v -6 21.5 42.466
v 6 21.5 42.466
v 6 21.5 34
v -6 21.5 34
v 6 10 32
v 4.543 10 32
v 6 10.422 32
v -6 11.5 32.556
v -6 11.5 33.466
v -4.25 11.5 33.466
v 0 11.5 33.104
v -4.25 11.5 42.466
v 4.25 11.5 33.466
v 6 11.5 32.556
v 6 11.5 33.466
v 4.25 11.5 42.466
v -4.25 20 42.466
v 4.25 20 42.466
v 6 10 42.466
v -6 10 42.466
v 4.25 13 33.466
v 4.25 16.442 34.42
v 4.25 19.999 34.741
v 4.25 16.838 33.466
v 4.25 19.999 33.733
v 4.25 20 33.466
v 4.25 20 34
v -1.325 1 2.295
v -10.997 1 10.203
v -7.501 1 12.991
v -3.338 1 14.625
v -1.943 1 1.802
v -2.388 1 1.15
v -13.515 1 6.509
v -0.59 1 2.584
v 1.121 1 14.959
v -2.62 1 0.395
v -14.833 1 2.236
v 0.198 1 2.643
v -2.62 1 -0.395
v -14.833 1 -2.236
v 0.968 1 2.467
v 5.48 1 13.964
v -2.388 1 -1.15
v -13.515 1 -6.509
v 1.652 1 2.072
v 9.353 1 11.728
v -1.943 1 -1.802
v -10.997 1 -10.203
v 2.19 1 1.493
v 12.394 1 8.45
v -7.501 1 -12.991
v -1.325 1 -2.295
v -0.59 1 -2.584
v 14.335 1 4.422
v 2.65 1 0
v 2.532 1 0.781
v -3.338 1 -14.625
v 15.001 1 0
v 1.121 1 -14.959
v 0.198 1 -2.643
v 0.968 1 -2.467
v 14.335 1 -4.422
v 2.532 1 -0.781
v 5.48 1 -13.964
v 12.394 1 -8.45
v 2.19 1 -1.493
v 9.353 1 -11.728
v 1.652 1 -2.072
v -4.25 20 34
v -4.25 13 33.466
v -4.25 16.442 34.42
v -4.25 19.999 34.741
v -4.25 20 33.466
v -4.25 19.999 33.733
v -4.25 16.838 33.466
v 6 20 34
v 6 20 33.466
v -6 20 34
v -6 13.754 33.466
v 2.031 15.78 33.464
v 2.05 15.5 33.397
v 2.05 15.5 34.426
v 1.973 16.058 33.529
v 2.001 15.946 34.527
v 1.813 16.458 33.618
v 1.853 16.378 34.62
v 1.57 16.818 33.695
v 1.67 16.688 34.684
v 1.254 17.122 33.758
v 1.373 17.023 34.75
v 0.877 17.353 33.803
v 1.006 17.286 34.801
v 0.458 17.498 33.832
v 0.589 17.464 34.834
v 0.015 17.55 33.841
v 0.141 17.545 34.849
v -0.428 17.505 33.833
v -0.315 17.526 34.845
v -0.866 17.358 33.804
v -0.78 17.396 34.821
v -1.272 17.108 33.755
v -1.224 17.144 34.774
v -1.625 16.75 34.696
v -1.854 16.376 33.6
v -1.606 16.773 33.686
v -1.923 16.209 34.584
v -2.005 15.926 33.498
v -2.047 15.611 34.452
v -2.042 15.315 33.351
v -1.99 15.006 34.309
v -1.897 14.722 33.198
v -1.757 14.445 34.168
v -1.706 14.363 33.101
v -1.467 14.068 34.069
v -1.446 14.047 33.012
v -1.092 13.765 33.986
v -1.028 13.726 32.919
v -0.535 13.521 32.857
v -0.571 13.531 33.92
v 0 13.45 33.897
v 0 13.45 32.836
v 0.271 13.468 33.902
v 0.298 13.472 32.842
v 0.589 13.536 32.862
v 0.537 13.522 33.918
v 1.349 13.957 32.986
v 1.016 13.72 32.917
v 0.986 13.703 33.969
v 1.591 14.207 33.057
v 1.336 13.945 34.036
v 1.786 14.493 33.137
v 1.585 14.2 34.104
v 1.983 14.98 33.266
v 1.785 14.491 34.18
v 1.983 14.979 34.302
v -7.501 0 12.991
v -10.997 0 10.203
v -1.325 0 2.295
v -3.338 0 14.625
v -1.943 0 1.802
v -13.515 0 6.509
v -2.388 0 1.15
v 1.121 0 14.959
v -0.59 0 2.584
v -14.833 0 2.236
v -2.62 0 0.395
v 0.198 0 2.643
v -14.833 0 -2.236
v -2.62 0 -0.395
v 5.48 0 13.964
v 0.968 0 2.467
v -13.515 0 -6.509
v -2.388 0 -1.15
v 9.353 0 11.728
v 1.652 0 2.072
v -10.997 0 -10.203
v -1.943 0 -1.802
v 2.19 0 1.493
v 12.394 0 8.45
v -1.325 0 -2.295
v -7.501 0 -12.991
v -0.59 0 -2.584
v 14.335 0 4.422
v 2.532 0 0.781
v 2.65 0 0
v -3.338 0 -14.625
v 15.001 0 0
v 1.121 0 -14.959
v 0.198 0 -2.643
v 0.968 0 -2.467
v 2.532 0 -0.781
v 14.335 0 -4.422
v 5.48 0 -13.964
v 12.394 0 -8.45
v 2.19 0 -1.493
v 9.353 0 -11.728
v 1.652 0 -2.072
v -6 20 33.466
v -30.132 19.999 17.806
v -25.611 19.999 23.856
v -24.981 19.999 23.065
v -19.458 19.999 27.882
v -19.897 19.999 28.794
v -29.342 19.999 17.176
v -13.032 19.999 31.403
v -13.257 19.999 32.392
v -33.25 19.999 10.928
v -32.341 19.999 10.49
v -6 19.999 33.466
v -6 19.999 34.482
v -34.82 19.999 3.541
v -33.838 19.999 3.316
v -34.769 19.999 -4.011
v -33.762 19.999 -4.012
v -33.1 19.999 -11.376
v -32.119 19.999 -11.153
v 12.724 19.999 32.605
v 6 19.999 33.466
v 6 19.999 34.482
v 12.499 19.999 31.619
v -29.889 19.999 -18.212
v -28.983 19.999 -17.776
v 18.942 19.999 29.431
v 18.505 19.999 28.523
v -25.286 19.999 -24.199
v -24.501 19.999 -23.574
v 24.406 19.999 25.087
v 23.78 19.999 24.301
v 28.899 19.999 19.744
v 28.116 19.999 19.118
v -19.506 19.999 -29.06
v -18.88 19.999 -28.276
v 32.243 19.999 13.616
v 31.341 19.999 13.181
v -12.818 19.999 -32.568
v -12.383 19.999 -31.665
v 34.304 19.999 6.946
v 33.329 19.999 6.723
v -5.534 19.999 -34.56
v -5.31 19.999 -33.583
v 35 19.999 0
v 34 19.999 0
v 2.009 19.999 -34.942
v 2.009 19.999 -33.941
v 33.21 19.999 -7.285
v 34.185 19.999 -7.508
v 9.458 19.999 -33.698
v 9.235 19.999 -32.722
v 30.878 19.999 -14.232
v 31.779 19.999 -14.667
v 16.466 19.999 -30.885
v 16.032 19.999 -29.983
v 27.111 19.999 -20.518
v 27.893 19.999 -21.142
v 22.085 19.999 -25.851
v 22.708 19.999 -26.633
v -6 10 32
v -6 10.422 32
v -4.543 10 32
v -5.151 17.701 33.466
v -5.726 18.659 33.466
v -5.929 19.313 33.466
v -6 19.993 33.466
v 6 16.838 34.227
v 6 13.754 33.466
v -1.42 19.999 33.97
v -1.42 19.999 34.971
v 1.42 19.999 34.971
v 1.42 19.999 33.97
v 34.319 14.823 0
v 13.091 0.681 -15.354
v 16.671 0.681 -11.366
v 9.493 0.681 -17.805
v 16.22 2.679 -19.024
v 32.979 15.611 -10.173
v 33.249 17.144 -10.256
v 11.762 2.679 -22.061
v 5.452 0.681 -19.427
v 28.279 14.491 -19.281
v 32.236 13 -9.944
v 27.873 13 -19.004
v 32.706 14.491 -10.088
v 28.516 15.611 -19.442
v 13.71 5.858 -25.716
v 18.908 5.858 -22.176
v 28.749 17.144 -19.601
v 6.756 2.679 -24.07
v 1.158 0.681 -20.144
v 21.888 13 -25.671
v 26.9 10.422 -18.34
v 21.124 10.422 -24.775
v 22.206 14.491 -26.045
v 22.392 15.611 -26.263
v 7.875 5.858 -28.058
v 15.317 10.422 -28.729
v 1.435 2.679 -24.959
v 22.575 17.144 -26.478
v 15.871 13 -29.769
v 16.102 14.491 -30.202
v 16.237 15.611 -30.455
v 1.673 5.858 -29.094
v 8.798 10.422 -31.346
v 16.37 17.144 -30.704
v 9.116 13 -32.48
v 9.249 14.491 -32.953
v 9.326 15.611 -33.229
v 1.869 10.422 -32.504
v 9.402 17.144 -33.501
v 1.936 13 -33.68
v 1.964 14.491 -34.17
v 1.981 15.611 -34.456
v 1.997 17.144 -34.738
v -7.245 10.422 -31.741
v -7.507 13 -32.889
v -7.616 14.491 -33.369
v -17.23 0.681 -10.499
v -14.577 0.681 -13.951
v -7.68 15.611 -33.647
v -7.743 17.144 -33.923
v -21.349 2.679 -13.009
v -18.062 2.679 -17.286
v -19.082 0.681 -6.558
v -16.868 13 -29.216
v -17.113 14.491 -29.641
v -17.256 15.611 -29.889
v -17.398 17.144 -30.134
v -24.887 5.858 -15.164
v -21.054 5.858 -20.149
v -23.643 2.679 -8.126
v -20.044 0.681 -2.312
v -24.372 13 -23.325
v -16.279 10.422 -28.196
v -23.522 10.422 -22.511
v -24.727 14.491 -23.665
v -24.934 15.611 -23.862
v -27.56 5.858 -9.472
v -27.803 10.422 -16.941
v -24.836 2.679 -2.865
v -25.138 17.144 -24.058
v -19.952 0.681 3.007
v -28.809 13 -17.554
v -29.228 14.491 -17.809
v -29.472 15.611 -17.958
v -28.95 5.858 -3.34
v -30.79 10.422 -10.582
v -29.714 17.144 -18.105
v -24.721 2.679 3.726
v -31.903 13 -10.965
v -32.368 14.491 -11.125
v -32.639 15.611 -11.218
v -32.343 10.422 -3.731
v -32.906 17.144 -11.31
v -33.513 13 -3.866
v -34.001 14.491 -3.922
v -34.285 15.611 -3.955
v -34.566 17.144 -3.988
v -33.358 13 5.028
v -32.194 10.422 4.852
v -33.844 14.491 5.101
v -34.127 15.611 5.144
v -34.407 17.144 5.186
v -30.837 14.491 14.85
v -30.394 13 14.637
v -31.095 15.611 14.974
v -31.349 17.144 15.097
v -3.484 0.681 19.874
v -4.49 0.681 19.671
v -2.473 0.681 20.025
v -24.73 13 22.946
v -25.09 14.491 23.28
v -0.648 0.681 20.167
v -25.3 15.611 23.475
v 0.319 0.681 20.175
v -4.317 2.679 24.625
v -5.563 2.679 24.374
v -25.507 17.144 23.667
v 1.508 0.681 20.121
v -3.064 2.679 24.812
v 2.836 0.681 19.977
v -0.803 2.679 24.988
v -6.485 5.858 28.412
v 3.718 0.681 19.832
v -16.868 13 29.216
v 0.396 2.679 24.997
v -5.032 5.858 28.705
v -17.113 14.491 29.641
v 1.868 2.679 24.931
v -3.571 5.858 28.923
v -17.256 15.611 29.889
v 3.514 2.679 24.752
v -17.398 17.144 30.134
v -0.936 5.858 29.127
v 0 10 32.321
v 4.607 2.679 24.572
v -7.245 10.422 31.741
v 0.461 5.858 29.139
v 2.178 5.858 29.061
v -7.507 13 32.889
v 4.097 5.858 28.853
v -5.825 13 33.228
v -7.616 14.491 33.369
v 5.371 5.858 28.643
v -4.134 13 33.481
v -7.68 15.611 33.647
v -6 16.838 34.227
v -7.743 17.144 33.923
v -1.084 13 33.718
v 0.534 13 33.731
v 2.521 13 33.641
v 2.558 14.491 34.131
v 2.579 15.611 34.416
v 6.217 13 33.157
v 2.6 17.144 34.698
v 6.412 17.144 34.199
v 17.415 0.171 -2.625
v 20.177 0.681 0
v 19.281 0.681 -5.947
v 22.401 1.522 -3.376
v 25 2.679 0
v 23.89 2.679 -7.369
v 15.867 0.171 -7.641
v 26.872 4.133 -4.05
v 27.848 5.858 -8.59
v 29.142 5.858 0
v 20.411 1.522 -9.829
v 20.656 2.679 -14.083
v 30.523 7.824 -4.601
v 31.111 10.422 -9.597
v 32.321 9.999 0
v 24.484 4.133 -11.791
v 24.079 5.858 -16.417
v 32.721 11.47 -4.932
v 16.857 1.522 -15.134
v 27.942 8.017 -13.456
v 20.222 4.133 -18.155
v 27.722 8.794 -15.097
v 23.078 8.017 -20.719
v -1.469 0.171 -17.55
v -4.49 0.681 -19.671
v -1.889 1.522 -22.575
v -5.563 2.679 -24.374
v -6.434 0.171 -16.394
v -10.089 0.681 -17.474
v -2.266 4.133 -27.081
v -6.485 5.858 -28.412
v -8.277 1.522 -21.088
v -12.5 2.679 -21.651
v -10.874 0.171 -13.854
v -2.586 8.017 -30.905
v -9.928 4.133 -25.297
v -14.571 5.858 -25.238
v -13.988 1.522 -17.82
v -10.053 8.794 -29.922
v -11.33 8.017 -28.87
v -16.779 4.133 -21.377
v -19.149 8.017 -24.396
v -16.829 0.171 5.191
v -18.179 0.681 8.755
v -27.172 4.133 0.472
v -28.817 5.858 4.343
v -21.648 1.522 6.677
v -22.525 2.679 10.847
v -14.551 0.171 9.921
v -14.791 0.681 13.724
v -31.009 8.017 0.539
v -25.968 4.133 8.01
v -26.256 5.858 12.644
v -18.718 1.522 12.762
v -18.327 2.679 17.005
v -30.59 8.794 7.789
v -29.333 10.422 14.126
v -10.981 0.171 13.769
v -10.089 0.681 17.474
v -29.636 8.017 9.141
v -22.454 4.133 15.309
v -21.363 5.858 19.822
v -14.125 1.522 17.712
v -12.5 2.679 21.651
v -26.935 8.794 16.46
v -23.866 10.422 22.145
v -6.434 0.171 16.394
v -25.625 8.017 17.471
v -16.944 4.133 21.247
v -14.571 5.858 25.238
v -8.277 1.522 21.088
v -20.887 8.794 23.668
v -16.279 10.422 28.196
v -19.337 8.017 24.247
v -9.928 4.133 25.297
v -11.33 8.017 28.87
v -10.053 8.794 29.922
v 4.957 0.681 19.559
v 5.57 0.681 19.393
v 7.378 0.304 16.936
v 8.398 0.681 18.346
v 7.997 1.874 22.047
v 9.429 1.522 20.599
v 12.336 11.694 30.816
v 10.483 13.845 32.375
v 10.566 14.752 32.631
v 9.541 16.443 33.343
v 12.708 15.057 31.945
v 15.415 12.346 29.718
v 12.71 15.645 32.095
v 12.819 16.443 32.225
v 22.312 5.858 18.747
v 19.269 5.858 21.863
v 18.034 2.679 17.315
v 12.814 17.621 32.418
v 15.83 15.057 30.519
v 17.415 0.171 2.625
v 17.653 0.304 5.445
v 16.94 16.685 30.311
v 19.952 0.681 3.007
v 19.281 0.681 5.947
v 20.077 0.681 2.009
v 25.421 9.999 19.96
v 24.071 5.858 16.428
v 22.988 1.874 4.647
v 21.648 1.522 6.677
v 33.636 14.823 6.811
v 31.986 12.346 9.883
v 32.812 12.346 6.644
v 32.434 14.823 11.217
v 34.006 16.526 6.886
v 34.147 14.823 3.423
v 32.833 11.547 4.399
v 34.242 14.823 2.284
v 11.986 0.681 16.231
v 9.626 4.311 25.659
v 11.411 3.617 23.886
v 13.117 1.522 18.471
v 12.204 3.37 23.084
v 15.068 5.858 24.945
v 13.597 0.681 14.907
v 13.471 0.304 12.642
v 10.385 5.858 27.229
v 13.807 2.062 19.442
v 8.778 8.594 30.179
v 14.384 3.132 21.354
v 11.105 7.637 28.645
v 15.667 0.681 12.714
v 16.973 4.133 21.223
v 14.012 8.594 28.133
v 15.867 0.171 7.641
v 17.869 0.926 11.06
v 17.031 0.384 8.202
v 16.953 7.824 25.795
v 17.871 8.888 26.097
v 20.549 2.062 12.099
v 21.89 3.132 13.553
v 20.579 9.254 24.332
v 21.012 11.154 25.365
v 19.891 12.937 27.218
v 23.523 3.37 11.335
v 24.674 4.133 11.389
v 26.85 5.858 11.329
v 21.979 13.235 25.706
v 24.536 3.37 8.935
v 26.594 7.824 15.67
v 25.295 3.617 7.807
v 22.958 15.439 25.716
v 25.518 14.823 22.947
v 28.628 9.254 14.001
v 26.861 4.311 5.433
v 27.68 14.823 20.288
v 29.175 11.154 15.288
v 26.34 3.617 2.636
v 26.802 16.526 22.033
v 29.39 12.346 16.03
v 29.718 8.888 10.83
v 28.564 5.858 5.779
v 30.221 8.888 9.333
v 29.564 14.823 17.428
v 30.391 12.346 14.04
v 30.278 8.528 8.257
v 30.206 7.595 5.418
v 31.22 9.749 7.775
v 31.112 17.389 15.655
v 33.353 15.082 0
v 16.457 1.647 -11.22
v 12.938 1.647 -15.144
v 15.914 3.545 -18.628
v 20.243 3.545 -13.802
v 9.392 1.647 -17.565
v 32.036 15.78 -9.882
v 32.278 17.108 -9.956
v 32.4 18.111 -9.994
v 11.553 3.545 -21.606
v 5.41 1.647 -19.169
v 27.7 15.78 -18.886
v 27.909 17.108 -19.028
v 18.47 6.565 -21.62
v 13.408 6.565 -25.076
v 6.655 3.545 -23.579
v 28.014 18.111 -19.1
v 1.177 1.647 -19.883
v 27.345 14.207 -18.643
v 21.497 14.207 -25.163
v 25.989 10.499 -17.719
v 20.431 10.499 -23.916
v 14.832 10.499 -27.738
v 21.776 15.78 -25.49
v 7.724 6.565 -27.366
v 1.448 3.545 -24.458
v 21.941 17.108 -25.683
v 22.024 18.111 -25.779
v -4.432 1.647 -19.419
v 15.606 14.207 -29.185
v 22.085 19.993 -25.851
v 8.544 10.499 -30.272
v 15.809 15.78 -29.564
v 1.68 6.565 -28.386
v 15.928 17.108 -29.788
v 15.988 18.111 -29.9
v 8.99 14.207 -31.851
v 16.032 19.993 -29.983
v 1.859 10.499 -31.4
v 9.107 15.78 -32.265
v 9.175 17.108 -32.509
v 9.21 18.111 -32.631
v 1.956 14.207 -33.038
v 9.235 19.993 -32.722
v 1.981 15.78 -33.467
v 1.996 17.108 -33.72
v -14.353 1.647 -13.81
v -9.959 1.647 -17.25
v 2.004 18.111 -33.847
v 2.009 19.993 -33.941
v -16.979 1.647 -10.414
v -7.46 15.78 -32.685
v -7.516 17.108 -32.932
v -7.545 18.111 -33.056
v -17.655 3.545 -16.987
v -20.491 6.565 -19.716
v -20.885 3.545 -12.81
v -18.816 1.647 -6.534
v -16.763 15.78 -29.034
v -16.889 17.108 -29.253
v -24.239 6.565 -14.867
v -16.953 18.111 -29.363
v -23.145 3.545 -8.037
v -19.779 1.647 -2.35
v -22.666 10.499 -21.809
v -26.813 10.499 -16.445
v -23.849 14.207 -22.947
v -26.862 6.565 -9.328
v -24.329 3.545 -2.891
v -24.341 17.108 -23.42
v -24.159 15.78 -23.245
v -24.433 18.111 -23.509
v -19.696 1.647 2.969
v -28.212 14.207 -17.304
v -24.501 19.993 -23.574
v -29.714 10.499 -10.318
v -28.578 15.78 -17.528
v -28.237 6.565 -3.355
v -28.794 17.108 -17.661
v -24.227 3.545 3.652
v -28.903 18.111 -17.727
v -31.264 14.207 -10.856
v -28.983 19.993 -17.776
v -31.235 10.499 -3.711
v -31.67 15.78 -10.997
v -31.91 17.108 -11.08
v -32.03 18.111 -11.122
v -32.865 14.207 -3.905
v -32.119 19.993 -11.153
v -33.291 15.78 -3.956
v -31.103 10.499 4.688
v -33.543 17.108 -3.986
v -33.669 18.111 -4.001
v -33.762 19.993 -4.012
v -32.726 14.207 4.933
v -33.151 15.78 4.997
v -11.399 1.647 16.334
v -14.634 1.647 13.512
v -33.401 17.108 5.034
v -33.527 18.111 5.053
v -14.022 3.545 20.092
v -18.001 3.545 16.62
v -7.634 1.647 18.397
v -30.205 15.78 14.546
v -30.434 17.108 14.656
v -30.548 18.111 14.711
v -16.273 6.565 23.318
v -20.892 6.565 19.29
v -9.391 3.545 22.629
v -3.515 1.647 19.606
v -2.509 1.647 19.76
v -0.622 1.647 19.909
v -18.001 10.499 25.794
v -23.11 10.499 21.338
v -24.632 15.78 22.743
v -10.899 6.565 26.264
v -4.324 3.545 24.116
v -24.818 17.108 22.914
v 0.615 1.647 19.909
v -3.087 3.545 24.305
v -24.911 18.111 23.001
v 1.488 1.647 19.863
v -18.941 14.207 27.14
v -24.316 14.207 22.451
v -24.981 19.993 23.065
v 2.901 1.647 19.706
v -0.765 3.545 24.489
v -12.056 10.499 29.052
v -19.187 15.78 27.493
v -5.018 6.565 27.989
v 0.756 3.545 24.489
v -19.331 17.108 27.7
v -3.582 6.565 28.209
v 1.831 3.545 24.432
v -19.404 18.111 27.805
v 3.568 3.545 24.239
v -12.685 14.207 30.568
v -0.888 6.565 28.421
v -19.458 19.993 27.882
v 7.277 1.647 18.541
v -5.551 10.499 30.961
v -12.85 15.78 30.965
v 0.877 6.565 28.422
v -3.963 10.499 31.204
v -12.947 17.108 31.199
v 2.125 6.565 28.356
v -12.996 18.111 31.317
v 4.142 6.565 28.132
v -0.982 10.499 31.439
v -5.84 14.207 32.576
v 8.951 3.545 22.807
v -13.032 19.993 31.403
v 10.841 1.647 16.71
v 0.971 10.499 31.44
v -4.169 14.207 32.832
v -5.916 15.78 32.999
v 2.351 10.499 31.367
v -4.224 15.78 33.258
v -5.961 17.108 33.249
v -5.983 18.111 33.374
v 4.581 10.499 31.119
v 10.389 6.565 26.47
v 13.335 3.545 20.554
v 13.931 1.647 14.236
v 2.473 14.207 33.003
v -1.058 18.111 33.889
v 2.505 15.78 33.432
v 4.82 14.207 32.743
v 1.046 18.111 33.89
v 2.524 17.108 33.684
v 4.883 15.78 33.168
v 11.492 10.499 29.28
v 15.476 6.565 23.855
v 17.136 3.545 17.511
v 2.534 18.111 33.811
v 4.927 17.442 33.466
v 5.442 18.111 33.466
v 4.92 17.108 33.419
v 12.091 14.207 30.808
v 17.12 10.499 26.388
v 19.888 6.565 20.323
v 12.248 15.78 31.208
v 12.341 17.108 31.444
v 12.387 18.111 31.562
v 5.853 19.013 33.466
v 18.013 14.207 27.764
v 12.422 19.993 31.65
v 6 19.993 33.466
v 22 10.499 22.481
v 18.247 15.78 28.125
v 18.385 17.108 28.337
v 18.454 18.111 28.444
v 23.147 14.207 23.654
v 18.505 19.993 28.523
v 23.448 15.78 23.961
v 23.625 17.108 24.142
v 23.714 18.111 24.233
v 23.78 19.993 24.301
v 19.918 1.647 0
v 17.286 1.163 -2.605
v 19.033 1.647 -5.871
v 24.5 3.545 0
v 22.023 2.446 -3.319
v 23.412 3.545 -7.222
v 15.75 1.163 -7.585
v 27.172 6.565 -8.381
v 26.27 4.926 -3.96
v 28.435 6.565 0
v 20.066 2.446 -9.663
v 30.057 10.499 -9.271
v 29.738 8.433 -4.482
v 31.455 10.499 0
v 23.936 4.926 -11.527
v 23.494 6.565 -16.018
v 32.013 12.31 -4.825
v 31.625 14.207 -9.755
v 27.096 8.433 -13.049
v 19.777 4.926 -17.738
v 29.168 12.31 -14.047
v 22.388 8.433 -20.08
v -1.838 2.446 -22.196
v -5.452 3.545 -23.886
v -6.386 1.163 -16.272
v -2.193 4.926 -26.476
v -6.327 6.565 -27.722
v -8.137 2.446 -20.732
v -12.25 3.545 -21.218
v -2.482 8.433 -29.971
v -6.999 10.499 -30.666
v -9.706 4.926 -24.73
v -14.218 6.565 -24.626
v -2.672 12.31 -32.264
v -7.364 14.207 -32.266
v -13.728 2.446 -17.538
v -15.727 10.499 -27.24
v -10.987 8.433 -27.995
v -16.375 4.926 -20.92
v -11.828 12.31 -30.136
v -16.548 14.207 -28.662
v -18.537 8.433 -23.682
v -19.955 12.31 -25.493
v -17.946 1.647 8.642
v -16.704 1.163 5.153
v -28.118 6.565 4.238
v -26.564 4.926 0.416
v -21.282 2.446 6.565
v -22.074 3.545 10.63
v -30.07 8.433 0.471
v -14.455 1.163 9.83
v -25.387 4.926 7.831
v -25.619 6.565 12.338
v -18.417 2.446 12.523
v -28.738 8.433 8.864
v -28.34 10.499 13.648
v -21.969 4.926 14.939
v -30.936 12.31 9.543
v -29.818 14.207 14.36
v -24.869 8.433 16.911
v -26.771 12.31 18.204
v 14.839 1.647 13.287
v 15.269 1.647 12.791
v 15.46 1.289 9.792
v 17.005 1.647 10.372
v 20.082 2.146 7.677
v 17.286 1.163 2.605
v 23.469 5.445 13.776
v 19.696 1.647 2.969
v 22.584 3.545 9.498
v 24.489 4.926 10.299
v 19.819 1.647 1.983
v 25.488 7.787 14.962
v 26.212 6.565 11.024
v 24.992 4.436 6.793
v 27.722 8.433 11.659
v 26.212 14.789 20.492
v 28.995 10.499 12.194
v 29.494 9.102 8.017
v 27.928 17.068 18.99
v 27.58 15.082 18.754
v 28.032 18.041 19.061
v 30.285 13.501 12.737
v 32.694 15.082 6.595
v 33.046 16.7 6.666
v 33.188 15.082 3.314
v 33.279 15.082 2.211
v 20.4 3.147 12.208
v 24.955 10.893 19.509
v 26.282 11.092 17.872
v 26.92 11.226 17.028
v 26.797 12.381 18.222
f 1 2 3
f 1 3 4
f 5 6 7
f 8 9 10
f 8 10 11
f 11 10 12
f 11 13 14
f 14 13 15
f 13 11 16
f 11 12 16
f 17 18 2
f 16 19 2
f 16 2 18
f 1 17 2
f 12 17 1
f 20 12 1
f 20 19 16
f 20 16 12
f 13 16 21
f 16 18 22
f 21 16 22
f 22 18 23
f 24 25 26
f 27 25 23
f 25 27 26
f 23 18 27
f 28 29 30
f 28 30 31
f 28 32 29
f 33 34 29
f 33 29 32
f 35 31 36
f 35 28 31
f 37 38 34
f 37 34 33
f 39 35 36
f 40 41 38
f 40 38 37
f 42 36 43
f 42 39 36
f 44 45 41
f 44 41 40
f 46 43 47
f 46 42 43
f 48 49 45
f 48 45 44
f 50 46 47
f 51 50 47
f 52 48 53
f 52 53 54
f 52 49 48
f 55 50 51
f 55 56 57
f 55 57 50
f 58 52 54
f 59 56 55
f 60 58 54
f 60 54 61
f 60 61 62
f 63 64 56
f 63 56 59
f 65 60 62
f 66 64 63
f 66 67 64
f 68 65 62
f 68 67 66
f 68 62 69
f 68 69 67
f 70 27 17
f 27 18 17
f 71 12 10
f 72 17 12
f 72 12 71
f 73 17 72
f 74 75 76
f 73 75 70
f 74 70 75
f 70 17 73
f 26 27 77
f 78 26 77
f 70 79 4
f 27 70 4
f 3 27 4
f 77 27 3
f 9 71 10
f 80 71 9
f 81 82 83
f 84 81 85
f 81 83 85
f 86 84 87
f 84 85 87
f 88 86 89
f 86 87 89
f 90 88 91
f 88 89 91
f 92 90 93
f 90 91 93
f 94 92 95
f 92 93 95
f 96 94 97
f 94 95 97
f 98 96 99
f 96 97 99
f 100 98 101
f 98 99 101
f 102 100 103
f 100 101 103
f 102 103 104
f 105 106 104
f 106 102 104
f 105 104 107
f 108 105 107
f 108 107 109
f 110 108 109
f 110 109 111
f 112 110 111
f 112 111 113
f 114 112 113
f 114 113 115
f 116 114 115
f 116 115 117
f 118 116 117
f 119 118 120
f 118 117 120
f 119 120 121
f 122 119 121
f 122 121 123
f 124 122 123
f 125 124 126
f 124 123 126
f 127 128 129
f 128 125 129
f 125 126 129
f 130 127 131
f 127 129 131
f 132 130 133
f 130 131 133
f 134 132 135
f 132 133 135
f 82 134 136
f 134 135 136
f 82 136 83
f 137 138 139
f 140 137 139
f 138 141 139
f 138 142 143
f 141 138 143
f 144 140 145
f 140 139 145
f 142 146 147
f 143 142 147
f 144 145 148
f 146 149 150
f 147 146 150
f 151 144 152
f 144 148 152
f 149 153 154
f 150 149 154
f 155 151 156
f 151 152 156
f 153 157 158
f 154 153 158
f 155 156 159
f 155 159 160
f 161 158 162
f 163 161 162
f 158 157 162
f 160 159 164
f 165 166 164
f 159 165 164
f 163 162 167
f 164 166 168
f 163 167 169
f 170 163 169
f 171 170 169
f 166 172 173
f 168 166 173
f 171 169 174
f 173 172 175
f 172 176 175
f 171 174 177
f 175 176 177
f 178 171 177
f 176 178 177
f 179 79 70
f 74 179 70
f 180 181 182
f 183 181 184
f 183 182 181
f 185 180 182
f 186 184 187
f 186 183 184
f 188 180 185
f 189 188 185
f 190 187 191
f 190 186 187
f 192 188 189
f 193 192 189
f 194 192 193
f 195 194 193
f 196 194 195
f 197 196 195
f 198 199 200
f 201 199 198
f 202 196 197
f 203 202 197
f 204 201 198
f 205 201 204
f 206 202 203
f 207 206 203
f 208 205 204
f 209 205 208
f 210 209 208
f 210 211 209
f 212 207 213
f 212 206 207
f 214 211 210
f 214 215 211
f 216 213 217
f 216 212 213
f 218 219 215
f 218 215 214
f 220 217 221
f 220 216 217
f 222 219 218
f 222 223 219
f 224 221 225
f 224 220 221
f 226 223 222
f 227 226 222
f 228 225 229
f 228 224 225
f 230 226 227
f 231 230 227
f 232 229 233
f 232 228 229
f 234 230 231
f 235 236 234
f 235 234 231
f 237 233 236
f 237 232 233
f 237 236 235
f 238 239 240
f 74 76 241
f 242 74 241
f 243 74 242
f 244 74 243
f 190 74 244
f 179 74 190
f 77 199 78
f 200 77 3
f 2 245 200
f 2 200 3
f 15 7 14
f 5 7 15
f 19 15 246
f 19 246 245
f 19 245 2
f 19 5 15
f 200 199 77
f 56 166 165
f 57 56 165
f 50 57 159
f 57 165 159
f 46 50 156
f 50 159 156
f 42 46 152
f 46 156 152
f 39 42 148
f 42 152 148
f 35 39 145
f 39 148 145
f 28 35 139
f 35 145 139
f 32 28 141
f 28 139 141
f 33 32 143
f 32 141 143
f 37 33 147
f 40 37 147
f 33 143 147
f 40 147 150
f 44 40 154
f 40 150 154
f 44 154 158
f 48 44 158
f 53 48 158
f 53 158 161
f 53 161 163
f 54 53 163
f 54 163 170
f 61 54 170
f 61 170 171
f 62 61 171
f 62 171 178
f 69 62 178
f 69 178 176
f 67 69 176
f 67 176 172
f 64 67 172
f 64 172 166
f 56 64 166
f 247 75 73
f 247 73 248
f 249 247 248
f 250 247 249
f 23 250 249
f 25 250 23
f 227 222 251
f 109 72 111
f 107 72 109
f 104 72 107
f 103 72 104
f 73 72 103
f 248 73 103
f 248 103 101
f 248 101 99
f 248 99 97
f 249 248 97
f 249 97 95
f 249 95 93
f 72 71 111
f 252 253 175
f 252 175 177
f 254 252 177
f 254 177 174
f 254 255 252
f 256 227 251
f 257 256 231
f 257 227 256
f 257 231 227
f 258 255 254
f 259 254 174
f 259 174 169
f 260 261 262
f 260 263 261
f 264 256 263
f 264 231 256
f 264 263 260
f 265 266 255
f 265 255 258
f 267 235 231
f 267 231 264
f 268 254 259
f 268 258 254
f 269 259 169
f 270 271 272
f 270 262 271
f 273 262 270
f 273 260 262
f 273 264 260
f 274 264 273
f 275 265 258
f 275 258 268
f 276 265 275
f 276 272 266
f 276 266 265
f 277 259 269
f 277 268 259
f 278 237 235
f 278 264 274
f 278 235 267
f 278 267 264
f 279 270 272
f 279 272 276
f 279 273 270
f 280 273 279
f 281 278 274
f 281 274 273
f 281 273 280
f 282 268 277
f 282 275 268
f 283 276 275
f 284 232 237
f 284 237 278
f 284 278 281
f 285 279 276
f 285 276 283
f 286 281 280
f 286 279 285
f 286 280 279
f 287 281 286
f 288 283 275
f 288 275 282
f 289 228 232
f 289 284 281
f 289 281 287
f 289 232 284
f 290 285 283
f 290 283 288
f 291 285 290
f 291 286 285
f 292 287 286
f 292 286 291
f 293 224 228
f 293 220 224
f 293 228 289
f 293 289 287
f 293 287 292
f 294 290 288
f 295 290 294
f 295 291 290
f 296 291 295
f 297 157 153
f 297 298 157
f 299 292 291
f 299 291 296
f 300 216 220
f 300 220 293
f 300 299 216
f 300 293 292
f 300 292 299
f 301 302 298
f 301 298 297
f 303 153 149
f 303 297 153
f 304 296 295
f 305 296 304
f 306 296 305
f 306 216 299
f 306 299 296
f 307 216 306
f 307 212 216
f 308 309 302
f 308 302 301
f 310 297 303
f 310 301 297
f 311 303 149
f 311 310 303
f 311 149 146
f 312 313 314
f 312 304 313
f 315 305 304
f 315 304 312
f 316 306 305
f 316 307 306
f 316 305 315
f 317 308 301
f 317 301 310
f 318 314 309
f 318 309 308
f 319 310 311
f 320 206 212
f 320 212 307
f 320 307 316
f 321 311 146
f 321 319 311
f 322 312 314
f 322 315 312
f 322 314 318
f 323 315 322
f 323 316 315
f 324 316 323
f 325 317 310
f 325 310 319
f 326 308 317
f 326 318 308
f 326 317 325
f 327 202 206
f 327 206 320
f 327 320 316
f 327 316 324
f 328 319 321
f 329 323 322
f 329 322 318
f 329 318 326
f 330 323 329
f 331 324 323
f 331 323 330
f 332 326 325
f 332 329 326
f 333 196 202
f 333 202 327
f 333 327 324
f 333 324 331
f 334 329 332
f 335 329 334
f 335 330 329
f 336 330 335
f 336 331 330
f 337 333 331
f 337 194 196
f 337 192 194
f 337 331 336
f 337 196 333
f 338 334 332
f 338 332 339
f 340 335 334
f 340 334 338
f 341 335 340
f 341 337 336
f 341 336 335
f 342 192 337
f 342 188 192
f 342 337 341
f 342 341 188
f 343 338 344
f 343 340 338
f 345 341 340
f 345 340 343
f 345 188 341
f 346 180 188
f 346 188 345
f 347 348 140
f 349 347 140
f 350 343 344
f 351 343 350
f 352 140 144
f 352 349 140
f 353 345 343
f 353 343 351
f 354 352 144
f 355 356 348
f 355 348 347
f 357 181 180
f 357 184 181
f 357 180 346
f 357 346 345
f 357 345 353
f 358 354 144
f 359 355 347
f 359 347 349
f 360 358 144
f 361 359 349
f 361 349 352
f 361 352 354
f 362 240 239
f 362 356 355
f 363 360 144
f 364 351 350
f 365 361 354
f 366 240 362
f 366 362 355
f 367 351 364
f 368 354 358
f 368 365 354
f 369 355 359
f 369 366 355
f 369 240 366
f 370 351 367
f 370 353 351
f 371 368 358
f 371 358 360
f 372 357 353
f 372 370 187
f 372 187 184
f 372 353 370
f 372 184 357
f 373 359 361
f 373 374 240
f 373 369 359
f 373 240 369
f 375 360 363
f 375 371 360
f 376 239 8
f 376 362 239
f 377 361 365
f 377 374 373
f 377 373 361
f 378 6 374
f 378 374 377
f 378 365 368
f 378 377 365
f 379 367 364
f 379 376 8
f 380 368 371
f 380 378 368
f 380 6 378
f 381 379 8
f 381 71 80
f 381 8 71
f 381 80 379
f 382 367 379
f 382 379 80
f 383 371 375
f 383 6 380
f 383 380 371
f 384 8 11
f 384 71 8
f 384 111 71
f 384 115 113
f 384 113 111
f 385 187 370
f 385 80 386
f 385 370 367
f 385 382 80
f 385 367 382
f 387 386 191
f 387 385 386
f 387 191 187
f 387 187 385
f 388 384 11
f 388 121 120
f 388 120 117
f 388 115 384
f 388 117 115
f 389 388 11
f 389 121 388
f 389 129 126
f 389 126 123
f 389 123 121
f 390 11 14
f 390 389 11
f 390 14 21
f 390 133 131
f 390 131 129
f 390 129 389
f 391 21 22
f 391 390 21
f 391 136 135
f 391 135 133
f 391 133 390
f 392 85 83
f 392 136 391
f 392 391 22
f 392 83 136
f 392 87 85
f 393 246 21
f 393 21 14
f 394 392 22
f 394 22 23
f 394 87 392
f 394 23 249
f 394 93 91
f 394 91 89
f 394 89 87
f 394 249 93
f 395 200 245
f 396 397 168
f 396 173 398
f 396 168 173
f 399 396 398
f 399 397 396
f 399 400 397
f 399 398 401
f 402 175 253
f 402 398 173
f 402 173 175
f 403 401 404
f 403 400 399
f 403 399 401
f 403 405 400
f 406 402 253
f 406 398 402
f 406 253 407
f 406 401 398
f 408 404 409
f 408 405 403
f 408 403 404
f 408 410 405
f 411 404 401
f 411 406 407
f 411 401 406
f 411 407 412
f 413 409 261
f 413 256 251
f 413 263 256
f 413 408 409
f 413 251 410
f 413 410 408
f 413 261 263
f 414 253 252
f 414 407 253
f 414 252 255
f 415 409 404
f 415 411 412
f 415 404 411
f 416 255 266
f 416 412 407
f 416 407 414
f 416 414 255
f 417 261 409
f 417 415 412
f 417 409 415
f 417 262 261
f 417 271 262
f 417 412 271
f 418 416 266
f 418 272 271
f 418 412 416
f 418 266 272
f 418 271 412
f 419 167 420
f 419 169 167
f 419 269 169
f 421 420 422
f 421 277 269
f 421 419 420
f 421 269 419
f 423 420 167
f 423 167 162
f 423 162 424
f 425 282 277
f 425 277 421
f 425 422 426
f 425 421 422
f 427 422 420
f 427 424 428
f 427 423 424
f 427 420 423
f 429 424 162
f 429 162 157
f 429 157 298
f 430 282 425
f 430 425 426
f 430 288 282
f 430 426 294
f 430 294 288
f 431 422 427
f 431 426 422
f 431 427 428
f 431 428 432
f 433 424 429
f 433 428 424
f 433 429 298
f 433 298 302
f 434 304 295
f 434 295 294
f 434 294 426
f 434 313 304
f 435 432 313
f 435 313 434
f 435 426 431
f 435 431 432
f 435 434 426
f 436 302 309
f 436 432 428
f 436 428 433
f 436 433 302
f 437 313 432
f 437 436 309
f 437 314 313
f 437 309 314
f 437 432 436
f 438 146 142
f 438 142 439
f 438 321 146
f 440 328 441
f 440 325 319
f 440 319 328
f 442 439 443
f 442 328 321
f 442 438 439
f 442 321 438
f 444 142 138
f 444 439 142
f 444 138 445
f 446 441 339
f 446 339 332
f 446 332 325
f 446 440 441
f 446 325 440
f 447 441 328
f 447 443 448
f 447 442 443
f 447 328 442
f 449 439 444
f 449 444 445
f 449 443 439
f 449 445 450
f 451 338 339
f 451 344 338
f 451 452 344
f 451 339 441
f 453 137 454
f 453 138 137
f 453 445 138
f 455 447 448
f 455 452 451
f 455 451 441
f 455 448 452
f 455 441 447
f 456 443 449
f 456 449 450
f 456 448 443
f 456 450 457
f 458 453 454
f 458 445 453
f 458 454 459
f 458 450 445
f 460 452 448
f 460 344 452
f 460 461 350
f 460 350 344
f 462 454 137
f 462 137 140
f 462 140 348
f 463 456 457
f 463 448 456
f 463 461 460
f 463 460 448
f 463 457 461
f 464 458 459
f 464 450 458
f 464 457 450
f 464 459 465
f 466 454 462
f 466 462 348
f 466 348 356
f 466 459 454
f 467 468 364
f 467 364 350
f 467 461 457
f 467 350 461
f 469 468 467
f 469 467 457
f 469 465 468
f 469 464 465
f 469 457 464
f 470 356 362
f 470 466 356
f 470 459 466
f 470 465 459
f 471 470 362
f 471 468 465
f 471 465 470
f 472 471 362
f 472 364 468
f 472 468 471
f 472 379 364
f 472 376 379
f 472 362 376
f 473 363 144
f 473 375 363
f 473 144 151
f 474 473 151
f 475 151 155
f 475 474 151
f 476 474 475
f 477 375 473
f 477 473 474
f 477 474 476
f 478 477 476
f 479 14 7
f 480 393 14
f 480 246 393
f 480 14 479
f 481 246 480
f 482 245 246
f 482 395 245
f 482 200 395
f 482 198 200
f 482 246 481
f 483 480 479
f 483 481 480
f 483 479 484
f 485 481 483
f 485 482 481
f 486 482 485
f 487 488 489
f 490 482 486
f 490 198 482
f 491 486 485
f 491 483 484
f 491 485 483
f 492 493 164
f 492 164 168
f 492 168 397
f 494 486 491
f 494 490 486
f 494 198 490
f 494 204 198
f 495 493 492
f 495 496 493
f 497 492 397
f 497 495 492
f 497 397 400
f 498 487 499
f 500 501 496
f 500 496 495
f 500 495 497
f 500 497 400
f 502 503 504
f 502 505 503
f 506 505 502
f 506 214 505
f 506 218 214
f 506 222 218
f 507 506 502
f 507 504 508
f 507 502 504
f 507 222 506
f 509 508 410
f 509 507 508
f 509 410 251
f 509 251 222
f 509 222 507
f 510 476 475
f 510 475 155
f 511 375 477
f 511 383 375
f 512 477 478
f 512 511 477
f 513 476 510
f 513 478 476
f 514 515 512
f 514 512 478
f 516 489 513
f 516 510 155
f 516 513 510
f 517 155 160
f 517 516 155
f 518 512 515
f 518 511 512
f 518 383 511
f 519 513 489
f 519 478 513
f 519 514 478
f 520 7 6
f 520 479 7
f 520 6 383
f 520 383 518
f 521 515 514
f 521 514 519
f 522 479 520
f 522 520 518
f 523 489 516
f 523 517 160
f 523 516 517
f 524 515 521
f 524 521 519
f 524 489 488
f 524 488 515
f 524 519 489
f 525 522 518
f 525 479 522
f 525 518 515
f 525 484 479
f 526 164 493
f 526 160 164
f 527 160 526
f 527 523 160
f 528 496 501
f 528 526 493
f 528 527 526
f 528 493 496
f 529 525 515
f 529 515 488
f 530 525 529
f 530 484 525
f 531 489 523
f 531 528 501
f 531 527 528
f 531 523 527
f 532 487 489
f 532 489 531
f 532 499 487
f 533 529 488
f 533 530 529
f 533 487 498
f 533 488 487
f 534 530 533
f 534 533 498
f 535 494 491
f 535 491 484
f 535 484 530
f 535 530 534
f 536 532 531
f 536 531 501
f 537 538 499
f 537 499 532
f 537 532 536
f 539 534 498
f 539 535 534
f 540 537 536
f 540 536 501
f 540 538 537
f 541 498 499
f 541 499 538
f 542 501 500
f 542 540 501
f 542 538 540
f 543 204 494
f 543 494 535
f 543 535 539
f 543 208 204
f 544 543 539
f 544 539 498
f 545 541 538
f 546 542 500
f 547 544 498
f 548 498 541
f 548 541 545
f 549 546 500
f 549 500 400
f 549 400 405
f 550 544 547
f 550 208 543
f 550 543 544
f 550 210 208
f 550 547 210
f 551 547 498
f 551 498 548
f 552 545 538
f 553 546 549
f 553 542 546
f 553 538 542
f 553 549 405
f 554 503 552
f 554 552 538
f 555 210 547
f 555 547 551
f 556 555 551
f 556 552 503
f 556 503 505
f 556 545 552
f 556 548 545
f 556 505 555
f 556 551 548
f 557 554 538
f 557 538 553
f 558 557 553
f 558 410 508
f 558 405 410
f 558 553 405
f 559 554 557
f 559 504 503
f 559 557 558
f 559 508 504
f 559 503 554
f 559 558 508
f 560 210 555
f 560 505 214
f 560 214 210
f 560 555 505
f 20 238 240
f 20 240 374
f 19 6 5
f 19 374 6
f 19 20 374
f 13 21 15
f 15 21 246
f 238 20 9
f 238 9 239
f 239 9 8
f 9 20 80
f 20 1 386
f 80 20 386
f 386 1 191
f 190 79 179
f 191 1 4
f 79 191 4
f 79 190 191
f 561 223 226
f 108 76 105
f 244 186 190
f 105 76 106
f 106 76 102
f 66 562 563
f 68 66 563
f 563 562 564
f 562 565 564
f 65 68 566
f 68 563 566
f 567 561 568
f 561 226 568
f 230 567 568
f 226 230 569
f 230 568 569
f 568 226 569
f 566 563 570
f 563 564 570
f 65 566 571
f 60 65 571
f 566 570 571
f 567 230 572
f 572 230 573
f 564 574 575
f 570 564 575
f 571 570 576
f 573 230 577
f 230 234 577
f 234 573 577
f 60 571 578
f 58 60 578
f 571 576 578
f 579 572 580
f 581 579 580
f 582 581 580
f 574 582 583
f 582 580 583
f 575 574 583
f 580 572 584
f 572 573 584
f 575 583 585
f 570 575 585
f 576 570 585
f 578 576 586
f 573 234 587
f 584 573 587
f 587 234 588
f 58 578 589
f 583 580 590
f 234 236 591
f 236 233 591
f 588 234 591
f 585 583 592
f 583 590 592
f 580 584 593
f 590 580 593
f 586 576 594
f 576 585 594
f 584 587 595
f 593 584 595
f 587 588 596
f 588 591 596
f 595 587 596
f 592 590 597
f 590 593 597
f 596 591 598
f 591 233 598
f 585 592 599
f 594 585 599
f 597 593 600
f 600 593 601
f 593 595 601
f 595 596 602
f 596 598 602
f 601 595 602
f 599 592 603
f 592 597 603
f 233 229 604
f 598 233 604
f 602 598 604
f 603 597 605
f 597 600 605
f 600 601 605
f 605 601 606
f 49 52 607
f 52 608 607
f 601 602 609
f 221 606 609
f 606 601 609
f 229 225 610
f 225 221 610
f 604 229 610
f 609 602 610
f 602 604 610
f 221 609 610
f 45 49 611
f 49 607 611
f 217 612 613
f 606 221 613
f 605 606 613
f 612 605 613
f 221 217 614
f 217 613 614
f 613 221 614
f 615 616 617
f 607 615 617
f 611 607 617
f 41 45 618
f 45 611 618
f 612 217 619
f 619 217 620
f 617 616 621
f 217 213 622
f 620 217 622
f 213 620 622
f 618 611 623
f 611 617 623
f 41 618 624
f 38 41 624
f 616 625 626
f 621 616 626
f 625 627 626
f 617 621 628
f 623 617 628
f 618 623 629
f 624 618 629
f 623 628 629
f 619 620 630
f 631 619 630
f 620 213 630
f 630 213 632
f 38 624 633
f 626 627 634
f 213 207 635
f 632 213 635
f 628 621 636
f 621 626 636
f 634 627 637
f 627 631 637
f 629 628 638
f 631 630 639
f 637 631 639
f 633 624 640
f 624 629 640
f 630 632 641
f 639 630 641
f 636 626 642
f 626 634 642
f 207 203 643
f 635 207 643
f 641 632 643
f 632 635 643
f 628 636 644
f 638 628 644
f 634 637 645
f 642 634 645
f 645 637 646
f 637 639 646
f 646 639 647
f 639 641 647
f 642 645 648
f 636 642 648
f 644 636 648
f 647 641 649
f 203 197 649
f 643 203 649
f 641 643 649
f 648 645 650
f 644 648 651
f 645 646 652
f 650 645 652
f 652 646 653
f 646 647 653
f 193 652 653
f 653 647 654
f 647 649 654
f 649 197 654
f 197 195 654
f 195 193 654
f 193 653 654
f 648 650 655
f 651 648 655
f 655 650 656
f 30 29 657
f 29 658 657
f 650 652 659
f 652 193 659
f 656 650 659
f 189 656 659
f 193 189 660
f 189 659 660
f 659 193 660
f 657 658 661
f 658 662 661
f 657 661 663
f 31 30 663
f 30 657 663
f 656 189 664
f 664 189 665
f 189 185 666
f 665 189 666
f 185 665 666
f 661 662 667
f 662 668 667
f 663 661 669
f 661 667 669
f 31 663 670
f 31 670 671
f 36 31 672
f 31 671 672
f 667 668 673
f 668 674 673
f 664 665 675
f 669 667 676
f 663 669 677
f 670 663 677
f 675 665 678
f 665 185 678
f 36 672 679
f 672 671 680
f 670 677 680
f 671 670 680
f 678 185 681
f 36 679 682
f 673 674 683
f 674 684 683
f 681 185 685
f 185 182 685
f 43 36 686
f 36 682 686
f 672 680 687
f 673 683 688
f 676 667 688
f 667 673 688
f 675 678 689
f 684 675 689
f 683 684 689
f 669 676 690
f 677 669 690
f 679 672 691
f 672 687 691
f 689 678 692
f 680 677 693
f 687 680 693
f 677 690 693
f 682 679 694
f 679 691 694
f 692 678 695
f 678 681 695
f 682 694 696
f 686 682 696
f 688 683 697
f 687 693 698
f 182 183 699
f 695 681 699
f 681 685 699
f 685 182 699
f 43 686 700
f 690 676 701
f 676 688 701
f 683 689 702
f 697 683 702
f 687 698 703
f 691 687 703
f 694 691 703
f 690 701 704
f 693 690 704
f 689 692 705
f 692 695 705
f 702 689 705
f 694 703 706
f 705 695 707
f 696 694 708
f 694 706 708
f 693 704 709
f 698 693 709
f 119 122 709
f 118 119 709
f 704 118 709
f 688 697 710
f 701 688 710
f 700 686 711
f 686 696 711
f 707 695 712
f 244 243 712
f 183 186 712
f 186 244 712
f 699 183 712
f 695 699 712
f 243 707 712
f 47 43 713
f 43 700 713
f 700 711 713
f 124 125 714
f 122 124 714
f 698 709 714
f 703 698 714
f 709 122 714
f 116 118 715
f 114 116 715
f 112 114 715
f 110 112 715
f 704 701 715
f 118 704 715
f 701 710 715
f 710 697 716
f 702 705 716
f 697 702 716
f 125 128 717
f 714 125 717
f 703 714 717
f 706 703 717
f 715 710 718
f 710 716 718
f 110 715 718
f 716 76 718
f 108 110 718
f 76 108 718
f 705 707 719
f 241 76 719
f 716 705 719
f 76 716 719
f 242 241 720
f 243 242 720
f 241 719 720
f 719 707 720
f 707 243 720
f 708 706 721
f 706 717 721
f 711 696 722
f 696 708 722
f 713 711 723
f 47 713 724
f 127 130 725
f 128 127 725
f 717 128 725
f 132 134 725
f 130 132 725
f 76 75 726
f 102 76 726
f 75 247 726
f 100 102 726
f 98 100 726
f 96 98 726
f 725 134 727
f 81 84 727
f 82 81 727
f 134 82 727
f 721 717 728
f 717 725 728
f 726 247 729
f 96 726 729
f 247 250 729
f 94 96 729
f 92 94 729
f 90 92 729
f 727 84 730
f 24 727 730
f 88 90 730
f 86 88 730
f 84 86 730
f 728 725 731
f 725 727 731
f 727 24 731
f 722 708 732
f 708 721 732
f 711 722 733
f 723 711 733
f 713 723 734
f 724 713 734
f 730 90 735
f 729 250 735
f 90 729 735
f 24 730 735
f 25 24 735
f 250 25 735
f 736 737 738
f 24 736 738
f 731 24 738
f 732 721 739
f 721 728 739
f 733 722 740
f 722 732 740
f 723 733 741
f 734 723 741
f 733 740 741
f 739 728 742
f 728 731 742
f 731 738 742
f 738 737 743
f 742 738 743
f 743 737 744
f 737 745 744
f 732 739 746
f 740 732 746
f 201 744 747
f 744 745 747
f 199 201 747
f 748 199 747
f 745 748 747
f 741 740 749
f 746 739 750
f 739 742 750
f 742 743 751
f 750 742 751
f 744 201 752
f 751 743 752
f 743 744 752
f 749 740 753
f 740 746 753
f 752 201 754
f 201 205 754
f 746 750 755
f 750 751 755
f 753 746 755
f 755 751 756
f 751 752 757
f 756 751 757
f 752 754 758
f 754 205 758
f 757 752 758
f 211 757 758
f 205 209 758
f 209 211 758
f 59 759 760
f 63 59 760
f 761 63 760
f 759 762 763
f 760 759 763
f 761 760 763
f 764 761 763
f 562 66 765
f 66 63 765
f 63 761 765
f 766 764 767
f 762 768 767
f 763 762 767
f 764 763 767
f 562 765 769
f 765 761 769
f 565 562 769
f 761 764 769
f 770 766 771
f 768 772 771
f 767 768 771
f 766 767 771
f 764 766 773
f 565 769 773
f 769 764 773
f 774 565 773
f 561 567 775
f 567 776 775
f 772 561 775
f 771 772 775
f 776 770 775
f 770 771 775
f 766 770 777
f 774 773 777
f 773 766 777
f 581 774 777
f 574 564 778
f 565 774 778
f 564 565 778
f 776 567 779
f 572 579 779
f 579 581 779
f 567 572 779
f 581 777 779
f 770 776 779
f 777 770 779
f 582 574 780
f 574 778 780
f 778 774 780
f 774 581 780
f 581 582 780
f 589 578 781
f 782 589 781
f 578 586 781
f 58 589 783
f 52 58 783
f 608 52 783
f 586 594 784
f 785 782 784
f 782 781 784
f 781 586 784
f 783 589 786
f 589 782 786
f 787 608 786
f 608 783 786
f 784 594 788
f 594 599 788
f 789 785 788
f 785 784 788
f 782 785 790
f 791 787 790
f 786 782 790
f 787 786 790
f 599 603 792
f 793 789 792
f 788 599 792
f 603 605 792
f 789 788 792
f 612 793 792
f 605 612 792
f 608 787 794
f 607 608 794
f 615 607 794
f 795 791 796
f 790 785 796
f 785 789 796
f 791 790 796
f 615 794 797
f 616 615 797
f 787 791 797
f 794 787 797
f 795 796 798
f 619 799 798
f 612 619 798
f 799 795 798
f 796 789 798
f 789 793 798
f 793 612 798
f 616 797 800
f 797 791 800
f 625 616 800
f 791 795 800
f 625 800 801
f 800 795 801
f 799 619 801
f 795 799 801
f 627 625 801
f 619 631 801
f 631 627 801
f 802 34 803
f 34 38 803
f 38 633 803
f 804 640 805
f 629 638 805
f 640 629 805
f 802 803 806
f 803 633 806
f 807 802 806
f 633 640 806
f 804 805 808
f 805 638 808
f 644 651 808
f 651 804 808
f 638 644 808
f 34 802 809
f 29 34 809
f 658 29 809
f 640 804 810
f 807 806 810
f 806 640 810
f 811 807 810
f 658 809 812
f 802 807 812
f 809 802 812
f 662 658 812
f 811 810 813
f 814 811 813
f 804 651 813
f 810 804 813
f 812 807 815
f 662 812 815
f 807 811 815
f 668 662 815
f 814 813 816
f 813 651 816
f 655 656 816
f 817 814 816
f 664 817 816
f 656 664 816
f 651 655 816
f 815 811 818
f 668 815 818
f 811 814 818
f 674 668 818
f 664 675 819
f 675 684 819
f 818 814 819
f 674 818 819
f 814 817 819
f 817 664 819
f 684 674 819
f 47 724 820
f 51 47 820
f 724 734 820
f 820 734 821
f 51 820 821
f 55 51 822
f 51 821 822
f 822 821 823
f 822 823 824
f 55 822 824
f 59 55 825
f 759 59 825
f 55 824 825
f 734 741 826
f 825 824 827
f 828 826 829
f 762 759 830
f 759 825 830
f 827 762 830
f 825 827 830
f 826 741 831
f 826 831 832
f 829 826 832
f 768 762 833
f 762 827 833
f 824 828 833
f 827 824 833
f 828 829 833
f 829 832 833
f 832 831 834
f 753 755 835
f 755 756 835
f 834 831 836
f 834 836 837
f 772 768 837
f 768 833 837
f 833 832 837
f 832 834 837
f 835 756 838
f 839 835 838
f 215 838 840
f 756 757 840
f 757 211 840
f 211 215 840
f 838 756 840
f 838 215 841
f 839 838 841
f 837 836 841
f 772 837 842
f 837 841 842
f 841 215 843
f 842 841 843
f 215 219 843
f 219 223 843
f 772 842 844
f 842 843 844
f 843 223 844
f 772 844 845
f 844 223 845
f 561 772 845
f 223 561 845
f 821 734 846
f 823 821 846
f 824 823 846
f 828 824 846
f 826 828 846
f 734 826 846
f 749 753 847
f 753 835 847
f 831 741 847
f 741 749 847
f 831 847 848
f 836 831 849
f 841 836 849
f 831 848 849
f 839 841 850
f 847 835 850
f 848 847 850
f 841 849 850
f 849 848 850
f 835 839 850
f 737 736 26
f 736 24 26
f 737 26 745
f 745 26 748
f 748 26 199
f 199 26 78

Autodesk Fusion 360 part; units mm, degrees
sketch "Sketch1" plane through (0, 0, 0) normal (0, 0, 1) x (1, 0, 0)
  line L0 (0, 0) -> (15.001, 0)
  line L1 (35, 19.999) -> (35, 20)
  arc A0 (15.001, 0) -> (35, 19.999) centre (15.001, 19.999) ccw
  line L2 (0, 1) -> (15.001, 1)
  arc A1 (15.001, 1) -> (34, 19.999) centre (15.001, 19.999) ccw
  line L3 (34, 19.999) -> (34, 20)
  line L4 (34, 20) -> (35, 20)
  line L5 (0, 1) -> (0, 0)
  point P0 (35, 0)
  dimension "d1" = 35
  dimension "d2" = 20
  dimension "d3" = 19.999
  dimension "d4" = -1
revolve "Revolve1" add sketch "Sketch1" angle 360 about axis through (0, 1.75, 0) along (0, 1, 0)
ref_plane "WorkPlane1" through (0, 0, 35) normal (0, 0, 1) x (1, 0, 0)
sketch "Sketch2" plane through (0, 0, 35) normal (0, 0, 1) x (1, 0, 0)
  line L0 (0, 0) -> (0, 15.5)
  circle A0 centre (0, 15.5) radius 2.05
  dimension "d7" = 15.5
  dimension "d8" = 4.1
extrude "Extrude1" cut sketch "Sketch2" against normal blind 10
sketch "Sketch3" plane through (0, 0, 0) normal (0, -1, 0) x (1, 0, 0)
  circle A0 centre (0, 0) radius 15.001
  circle A1 centre (0, 0) radius 2.65
  dimension "d11" = 5.3
extrude "Extrude2" cut sketch "Sketch3" along normal blind 30 and the other way blind 30 contours A1
sketch "Sketch4" plane through (0, 20, 0) normal (0, 1, 0) x (-1, 0, 0)
  circle A0 centre (0, 0) radius 34
  circle A1 centre (0, 0) radius 35
  line L0 (-6, 42.4664) -> (6, 42.4664)
  line L1 (6, 42.4664) -> (6, 33.4664)
  line L2 (-6, 33.4664) -> (-6, 42.4664)
  line L3 (-6, 42.4664) -> (0, 34) construction
  line L4 (6, 42.4664) -> (0, 34) construction
  line L5 (0, 34) -> (-6, 34)
  line L6 (0, 34) -> (6, 34)
  dimension "d16" = 9
  dimension "d19" = 12
  dimension "d20" = 6
extrude "Extrude3" add sketch "Sketch4" along normal blind 1.5 contours A1 L1 L2 L5 L6 | A1 L0 L1 L2
sketch "Sketch5" plane through (0, 20, 0) normal (0, -1, 0) x (1, 0, 0)
  arc A0 (6, 34.4819) -> (-6, 34.4819) centre (0, 0) ccw
  line L0 (6, 34.4819) -> (6, 42.4664)
  line L1 (6, 42.4664) -> (-6, 42.4664)
  line L2 (-6, 42.4664) -> (-6, 34.4819)
  line L3 (6, 42.4664) -> (4.25, 42.4664)
  line L4 (4.25, 42.4664) -> (4.25, 33.4664)
  line L5 (4.25, 33.4664) -> (6, 33.4664)
  line L6 (6, 33.4664) -> (6, 42.4664)
  line L7 (-6, 42.4664) -> (-4.25, 42.4664)
  line L8 (-4.25, 42.4664) -> (-4.25, 33.4664)
  line L9 (-4.25, 33.4664) -> (-6, 33.4664)
  line L10 (-6, 33.4664) -> (-6, 42.4664)
  dimension "d21" = 9
  dimension "d22" = 1.75
  dimension "d23" = 1.75
  dimension "d24" = 9
extrude "Extrude4" add sketch "Sketch5" along normal blind 8 contours A0 L0 L1 L3 L4 L6 | A0 L1 L2 L7 L8 L10
extrude "Extrude5" cut sketch "Sketch5" along normal blind 8 contours A0 L4 L5 L6 | A0 L0 L1 L3 L4 L6 | A0 L8 L9 L10 | A0 L1 L2 L7 L8 L10
extrude "Extrude6" add sketch "Sketch5" along normal blind 8 contours A0 L4 L5 L6 | A0 L0 L1 L3 L4 L6 | A0 L8 L9 L10 | A0 L1 L2 L7 L8 L10
extrude "Extrude7" add sketch "Sketch5" along normal blind 8.5 contours A0 L4 L5 L6 | A0 L0 L1 L3 L4 L6 | A0 L8 L9 L10 | A0 L1 L2 L7 L8 L10
sketch "Sketch6" plane through (0, 11.5, 0) normal (0, -1, 0) x (1, 0, 0)
  line L0 (6, 33.4664) -> (6, 42.4664)
  line L1 (6, 42.4664) -> (4.25, 42.4664)
  line L2 (4.25, 42.4664) -> (4.25, 33.4664)
  line L3 (4.25, 33.4664) -> (6, 33.4664)
  line L4 (6, 42.4664) -> (-6, 42.4664)
  line L5 (-6, 42.4664) -> (-6, 32)
  line L6 (-6, 32) -> (6, 32)
  line L7 (6, 32) -> (6, 42.4664)
extrude "Extrude8" add sketch "Sketch6" along normal blind 1.5
